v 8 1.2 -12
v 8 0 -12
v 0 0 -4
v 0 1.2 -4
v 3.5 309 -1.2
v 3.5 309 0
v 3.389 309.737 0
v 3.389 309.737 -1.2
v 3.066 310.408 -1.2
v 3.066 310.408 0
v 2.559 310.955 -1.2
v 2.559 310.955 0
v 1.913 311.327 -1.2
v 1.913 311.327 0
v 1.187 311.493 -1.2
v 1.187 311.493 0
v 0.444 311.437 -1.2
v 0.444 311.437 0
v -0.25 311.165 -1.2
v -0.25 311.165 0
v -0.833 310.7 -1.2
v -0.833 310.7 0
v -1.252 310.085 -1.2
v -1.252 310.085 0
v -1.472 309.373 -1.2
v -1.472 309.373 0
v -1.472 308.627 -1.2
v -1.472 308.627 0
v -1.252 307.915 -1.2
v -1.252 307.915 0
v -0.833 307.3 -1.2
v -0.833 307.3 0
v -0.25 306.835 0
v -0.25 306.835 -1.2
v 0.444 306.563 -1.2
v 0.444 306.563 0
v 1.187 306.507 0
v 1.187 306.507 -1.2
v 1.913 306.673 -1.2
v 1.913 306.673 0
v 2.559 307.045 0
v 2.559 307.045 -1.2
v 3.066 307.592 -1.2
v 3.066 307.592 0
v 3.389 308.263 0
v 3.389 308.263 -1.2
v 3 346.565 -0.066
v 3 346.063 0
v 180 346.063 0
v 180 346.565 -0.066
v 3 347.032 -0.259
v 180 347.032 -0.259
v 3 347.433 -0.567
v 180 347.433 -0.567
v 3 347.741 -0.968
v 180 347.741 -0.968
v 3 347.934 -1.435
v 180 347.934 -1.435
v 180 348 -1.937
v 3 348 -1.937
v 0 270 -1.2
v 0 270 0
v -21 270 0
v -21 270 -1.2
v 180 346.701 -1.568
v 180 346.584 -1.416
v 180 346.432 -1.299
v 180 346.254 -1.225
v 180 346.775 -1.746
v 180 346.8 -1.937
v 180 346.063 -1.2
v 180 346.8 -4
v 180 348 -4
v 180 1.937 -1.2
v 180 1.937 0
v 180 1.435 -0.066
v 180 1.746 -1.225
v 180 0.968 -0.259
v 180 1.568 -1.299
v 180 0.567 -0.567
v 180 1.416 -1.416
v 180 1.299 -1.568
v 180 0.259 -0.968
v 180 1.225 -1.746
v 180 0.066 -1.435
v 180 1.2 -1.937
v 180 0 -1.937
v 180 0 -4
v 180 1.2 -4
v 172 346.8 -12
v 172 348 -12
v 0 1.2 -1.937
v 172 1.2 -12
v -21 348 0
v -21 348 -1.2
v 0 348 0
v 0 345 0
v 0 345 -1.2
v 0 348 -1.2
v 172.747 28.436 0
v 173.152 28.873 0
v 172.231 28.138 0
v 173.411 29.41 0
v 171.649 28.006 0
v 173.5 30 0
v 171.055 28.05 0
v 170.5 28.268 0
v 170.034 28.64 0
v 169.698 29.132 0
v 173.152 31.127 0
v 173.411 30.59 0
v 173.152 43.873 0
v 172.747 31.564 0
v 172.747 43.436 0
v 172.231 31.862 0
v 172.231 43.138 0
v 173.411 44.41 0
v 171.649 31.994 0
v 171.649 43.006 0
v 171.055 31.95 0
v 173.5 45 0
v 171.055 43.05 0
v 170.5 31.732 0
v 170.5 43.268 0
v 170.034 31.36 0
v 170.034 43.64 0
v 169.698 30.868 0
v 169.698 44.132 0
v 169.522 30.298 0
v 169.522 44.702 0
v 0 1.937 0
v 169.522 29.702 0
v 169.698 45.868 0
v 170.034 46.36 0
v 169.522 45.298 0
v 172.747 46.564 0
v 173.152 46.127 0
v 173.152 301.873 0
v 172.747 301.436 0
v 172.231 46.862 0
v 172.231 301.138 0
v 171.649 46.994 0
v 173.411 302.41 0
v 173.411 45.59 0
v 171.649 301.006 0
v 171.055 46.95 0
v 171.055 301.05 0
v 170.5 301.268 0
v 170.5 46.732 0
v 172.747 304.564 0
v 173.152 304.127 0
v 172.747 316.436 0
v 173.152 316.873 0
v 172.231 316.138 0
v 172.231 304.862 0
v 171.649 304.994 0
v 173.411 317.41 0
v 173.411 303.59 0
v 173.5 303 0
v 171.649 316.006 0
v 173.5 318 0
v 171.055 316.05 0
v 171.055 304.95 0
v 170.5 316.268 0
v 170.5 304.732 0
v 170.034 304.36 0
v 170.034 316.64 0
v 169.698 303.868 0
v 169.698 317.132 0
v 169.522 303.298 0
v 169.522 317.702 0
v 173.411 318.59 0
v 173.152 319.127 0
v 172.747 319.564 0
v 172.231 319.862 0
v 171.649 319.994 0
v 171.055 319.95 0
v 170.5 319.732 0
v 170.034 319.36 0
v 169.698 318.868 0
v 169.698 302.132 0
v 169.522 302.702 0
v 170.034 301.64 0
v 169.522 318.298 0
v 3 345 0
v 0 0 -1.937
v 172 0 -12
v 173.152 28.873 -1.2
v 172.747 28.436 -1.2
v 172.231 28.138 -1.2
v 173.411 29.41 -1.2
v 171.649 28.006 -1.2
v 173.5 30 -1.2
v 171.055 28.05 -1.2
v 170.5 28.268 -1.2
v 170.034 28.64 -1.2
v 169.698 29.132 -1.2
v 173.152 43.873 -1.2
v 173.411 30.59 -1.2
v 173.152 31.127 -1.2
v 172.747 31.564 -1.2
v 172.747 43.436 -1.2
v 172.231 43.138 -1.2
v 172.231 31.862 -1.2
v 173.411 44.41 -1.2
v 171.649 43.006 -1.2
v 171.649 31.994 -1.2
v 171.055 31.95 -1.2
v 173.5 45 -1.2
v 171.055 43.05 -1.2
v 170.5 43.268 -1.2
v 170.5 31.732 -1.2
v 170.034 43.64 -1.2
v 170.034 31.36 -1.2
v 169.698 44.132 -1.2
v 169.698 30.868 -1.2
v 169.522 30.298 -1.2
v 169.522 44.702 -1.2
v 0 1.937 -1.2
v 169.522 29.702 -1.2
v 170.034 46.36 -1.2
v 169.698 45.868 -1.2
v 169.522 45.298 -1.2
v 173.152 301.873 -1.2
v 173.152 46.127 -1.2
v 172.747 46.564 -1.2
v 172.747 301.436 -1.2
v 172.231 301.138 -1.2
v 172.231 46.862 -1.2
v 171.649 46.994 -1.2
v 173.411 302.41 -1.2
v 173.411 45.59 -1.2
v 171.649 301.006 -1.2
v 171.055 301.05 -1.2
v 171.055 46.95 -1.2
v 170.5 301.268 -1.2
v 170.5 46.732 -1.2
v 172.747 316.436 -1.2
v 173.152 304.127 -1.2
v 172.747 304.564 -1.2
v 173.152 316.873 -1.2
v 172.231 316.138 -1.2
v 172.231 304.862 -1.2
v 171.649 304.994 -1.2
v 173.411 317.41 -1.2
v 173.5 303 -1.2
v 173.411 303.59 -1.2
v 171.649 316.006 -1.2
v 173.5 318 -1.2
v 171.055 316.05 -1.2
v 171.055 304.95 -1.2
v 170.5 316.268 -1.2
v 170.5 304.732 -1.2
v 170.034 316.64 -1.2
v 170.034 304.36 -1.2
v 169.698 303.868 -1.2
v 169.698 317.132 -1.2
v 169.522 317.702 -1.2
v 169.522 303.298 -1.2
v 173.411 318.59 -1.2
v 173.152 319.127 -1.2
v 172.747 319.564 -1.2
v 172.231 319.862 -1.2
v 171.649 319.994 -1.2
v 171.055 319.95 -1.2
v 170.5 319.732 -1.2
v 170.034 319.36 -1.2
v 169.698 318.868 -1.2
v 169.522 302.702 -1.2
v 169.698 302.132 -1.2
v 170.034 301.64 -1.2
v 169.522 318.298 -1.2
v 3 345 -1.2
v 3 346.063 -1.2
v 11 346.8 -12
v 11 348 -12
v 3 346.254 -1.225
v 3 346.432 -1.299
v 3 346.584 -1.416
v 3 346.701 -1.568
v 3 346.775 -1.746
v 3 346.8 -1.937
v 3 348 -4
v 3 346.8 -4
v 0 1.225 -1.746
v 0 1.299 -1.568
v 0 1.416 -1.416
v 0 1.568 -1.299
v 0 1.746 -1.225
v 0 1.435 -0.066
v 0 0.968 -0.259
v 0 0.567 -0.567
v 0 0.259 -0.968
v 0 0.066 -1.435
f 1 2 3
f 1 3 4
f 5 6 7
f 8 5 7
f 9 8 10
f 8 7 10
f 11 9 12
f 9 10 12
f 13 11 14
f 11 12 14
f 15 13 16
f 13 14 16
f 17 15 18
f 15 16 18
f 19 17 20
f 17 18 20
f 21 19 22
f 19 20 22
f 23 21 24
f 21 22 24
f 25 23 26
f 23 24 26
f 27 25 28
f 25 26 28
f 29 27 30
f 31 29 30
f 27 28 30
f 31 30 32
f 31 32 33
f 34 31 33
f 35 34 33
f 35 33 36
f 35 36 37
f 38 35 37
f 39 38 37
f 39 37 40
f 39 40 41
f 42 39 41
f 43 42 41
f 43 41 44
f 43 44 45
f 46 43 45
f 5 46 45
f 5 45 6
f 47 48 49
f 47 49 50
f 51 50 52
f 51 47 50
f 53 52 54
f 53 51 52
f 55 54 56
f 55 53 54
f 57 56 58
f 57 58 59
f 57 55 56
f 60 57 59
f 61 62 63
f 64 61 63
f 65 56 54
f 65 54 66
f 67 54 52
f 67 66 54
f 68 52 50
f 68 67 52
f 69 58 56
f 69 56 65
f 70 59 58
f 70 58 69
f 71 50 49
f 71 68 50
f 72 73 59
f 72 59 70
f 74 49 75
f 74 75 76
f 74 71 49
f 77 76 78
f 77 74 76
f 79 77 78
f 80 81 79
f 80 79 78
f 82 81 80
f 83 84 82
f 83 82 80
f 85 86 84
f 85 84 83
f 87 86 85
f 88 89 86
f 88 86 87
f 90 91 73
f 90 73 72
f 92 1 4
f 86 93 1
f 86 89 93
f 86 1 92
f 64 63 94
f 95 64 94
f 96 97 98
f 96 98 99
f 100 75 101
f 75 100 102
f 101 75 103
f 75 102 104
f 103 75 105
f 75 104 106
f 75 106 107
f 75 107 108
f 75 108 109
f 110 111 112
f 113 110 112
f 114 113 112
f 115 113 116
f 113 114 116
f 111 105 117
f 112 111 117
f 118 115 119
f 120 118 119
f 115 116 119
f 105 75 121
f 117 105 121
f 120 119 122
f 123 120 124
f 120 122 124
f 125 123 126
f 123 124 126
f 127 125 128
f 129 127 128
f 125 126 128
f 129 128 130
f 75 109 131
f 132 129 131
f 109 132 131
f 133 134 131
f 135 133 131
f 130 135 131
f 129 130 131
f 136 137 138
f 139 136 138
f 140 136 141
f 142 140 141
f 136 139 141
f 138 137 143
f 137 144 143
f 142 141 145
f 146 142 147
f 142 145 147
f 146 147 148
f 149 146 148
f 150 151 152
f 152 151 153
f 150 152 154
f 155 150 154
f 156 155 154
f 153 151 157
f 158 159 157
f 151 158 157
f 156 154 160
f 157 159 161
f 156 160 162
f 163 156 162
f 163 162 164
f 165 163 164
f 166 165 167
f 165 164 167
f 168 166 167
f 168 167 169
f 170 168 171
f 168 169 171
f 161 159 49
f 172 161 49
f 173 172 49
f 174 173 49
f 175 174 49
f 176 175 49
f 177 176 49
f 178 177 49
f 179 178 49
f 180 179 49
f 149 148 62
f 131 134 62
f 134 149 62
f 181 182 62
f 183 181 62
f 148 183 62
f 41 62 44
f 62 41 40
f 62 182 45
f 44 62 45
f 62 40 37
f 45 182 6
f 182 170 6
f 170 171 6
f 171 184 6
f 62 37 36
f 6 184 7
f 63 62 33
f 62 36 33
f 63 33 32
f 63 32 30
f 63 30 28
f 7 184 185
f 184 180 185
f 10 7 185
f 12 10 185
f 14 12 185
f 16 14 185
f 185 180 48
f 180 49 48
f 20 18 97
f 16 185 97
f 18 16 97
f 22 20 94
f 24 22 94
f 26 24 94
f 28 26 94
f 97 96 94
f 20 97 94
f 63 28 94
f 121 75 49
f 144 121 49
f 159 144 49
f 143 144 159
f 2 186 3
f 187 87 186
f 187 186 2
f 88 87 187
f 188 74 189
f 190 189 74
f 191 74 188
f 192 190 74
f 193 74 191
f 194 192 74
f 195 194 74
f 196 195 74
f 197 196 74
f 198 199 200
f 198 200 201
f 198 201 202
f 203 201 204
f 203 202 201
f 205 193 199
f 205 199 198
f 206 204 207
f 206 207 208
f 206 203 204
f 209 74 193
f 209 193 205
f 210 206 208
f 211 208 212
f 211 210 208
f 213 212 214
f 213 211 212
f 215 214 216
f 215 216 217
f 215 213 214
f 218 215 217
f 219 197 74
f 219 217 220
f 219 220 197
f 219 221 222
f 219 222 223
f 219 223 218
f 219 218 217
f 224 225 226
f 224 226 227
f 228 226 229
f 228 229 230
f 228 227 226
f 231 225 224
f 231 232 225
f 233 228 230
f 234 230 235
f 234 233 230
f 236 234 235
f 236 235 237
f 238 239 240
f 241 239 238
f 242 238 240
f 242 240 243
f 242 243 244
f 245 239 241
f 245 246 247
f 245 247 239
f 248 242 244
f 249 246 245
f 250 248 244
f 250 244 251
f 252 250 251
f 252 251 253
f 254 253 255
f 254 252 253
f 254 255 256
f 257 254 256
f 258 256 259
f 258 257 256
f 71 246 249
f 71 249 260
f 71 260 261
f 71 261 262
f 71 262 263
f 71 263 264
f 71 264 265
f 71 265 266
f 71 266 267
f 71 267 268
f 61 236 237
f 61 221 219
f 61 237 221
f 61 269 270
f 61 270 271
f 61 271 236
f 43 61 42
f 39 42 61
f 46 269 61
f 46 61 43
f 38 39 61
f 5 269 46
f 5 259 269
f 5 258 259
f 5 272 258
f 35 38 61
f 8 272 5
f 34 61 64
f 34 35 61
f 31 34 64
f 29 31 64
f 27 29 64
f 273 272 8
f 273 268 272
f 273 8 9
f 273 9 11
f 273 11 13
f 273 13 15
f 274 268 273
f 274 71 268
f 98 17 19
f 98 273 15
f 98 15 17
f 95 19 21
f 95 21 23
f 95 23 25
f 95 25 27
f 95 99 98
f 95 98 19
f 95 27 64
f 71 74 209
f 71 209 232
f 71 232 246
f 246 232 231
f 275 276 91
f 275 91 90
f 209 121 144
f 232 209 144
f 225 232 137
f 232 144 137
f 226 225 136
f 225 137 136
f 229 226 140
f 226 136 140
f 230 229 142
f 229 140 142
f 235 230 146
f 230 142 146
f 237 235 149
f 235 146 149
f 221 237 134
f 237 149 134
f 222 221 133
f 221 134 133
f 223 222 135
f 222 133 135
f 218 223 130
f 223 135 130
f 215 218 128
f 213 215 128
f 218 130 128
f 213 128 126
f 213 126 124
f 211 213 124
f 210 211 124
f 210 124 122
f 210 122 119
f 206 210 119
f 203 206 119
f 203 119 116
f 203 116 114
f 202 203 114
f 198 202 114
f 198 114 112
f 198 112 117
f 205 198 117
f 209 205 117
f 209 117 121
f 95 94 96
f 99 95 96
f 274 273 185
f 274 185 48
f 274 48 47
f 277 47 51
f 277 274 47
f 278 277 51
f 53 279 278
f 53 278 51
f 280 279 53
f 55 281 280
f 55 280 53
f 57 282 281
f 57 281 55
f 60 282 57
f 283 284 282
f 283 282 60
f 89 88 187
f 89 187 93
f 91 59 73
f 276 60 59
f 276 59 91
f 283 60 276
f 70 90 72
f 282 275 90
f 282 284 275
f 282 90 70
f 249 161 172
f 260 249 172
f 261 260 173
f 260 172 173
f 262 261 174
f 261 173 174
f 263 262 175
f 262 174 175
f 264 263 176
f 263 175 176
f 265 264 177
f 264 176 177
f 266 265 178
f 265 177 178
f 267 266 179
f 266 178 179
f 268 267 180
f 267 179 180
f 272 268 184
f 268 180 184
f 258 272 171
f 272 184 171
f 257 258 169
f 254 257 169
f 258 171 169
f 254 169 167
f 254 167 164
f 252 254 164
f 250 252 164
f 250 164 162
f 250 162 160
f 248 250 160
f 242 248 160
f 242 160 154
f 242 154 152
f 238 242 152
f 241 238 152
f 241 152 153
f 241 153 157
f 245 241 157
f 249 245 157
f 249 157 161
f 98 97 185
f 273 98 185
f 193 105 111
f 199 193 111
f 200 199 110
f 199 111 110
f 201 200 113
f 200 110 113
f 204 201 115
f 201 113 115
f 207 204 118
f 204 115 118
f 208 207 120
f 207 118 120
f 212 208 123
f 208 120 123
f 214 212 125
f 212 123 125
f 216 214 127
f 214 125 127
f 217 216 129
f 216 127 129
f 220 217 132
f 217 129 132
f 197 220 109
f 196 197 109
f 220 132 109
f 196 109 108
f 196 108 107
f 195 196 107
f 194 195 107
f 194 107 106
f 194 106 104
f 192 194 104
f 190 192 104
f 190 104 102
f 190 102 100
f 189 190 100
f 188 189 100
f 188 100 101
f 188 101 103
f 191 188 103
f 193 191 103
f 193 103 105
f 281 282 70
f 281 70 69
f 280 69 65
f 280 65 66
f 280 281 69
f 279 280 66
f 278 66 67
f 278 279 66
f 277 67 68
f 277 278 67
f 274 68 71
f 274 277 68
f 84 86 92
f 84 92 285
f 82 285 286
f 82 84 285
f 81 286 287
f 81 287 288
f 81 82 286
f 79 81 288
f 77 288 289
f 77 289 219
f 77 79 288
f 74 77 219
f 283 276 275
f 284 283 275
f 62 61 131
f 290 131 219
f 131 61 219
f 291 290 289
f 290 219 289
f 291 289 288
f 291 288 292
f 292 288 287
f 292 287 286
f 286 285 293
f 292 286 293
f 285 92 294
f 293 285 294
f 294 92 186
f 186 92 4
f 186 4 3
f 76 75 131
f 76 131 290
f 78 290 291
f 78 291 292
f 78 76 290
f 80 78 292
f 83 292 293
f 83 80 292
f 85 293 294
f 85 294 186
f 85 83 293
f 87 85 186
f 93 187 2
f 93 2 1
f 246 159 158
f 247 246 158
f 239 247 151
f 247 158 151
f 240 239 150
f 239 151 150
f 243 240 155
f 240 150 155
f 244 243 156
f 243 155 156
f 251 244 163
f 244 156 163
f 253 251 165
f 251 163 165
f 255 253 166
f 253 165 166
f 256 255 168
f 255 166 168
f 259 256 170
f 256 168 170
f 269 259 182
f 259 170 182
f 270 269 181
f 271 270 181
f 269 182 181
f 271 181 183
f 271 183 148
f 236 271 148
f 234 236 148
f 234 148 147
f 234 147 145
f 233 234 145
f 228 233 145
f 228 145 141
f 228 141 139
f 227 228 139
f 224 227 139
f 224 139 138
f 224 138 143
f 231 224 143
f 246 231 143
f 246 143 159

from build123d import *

# Parameters (mm, degrees)
SM_BASE_FLANGE_1_DEPTH             = 1.2
SKETCH_6_R                         = 2.5
CUT_EXTRUDE_1_DEPTH                = 10
SKETCH_7_R                         = 2
CUT_EXTRUDE_2_DEPTH                = 10
SKETCH_8_W                         = 3
SKETCH_8_H                         = 3
CUT_EXTRUDE_3_DEPTH                = 10
SM_EDGE_FLANGE_1_STRIP_W           = 6.2732
SM_EDGE_FLANGE_1_STRIP_H           = 1.2
SM_EDGE_FLANGE_1_STRIP_CUT_DEPTH   = 177
SM_EDGE_FLANGE_1_STRIP_2_W         = 6.2732
SM_EDGE_FLANGE_1_STRIP_2_H         = 1.2
SM_EDGE_FLANGE_1_STRIP_CUT_2_DEPTH = 180
SM_EDGE_FLANGE_1_DEPTH             = 177
SM_EDGE_FLANGE_1_BEND_DEPTH        = 180
CHAMFER_1_SIZE                     = 8


# Sheet-metal steps are written as plain solids
with BuildPart() as part:
    # Sketch 1 → Базовая кромка1 (new body)
    with BuildSketch(Plane.XY):
        Polygon((0, 270), (-21, 270), (-21, 348), (180, 348), (180, 0), (0, 0), align=None)
    extrude(amount=-SM_BASE_FLANGE_1_DEPTH)

    # Эскиз6 → Вырез-Вытянуть1 (cut)
    with BuildSketch(Plane.XY):
        with Locations((1, 309)):
            Circle(SKETCH_6_R)
    extrude(amount=-CUT_EXTRUDE_1_DEPTH, mode=Mode.SUBTRACT)

    # Эскиз7 → Вырез-Вытянуть2 (cut)
    with BuildSketch(Plane.XY):
        with Locations((171.5, 318)):
            Circle(SKETCH_7_R)
        with Locations((171.5, 303)):
            Circle(SKETCH_7_R)
        with Locations((171.5, 45)):
            Circle(SKETCH_7_R)
        with Locations((171.5, 30)):
            Circle(SKETCH_7_R)
    extrude(amount=-CUT_EXTRUDE_2_DEPTH, mode=Mode.SUBTRACT)

    # Эскиз8 → Вырез-Вытянуть3 (cut)
    with BuildSketch(Plane.XY):
        with Locations((1.5, 346.5)):
            Rectangle(SKETCH_8_W, SKETCH_8_H)
    extrude(amount=-CUT_EXTRUDE_3_DEPTH, mode=Mode.SUBTRACT)

    # Ребро-кромка1 strip (across the edge) → Ребро-кромка1 strip cut (cut)
    with BuildSketch(Plane(origin=(3, 348, -1.2), x_dir=(0, -1, 0), z_dir=(1, 0, 0))):
        with Locations((-1.2, -0.6)):
            Rectangle(SM_EDGE_FLANGE_1_STRIP_W, SM_EDGE_FLANGE_1_STRIP_H)
    extrude(amount=SM_EDGE_FLANGE_1_STRIP_CUT_DEPTH, mode=Mode.SUBTRACT)

    # Ребро-кромка1 strip 2 (across the edge) → Ребро-кромка1 strip cut 2 (cut)
    with BuildSketch(Plane(origin=(180, 0, -1.2), x_dir=(0, 1, 0), z_dir=(-1, 0, 0))):
        with Locations((-1.2, -0.6)):
            Rectangle(SM_EDGE_FLANGE_1_STRIP_2_W, SM_EDGE_FLANGE_1_STRIP_2_H)
    extrude(amount=SM_EDGE_FLANGE_1_STRIP_CUT_2_DEPTH, mode=Mode.SUBTRACT)

    # Ребро-кромка1 section (across the edge) → Ребро-кромка1 (add)
    with BuildSketch(Plane(origin=(3, 348, -1.2), x_dir=(0, -1, 0), z_dir=(1, 0, 0))):
        with BuildLine():
            Line((0, 0.7366), (0, 10.8))
            Line((0, 10.8), (1.2, 10.8))
            Line((1.2, 10.8), (1.2, 0.7366))
            ThreePointArc((1.2, 0.7366), (1.415745145, 0.215745145), (1.9366, 0))
            Line((1.9366, 0), (1.9366, -1.2))
            ThreePointArc((1.9366, -1.2), (0.567217008, -0.632782992), (0, 0.7366))
        make_face()
    extrude(amount=SM_EDGE_FLANGE_1_DEPTH)

    # Ребро-кромка1 section 2 (across the edge) → Ребро-кромка1 bend (add)
    with BuildSketch(Plane(origin=(180, 0, -1.2), x_dir=(0, 1, 0), z_dir=(-1, 0, 0))):
        with BuildLine():
            Line((0, 0.7366), (0, 10.8))
            Line((0, 10.8), (1.2, 10.8))
            Line((1.2, 10.8), (1.2, 0.7366))
            ThreePointArc((1.2, 0.7366), (1.415745145, 0.215745145), (1.9366, 0))
            Line((1.9366, 0), (1.9366, -1.2))
            ThreePointArc((1.9366, -1.2), (0.567217008, -0.632782992), (0, 0.7366))
        make_face()
    extrude(amount=SM_EDGE_FLANGE_1_BEND_DEPTH)

    # Фаска1
    chamfer_1_edges = [part.edges().sort_by_distance(p)[0] for p in [
        (3, 347.4, -12),
        (180, 347.4, -12),
        (180, 0.6, -12),
        (0, 0.6, -12),
    ]]
    chamfer(chamfer_1_edges, length=CHAMFER_1_SIZE)


solid = part.part
